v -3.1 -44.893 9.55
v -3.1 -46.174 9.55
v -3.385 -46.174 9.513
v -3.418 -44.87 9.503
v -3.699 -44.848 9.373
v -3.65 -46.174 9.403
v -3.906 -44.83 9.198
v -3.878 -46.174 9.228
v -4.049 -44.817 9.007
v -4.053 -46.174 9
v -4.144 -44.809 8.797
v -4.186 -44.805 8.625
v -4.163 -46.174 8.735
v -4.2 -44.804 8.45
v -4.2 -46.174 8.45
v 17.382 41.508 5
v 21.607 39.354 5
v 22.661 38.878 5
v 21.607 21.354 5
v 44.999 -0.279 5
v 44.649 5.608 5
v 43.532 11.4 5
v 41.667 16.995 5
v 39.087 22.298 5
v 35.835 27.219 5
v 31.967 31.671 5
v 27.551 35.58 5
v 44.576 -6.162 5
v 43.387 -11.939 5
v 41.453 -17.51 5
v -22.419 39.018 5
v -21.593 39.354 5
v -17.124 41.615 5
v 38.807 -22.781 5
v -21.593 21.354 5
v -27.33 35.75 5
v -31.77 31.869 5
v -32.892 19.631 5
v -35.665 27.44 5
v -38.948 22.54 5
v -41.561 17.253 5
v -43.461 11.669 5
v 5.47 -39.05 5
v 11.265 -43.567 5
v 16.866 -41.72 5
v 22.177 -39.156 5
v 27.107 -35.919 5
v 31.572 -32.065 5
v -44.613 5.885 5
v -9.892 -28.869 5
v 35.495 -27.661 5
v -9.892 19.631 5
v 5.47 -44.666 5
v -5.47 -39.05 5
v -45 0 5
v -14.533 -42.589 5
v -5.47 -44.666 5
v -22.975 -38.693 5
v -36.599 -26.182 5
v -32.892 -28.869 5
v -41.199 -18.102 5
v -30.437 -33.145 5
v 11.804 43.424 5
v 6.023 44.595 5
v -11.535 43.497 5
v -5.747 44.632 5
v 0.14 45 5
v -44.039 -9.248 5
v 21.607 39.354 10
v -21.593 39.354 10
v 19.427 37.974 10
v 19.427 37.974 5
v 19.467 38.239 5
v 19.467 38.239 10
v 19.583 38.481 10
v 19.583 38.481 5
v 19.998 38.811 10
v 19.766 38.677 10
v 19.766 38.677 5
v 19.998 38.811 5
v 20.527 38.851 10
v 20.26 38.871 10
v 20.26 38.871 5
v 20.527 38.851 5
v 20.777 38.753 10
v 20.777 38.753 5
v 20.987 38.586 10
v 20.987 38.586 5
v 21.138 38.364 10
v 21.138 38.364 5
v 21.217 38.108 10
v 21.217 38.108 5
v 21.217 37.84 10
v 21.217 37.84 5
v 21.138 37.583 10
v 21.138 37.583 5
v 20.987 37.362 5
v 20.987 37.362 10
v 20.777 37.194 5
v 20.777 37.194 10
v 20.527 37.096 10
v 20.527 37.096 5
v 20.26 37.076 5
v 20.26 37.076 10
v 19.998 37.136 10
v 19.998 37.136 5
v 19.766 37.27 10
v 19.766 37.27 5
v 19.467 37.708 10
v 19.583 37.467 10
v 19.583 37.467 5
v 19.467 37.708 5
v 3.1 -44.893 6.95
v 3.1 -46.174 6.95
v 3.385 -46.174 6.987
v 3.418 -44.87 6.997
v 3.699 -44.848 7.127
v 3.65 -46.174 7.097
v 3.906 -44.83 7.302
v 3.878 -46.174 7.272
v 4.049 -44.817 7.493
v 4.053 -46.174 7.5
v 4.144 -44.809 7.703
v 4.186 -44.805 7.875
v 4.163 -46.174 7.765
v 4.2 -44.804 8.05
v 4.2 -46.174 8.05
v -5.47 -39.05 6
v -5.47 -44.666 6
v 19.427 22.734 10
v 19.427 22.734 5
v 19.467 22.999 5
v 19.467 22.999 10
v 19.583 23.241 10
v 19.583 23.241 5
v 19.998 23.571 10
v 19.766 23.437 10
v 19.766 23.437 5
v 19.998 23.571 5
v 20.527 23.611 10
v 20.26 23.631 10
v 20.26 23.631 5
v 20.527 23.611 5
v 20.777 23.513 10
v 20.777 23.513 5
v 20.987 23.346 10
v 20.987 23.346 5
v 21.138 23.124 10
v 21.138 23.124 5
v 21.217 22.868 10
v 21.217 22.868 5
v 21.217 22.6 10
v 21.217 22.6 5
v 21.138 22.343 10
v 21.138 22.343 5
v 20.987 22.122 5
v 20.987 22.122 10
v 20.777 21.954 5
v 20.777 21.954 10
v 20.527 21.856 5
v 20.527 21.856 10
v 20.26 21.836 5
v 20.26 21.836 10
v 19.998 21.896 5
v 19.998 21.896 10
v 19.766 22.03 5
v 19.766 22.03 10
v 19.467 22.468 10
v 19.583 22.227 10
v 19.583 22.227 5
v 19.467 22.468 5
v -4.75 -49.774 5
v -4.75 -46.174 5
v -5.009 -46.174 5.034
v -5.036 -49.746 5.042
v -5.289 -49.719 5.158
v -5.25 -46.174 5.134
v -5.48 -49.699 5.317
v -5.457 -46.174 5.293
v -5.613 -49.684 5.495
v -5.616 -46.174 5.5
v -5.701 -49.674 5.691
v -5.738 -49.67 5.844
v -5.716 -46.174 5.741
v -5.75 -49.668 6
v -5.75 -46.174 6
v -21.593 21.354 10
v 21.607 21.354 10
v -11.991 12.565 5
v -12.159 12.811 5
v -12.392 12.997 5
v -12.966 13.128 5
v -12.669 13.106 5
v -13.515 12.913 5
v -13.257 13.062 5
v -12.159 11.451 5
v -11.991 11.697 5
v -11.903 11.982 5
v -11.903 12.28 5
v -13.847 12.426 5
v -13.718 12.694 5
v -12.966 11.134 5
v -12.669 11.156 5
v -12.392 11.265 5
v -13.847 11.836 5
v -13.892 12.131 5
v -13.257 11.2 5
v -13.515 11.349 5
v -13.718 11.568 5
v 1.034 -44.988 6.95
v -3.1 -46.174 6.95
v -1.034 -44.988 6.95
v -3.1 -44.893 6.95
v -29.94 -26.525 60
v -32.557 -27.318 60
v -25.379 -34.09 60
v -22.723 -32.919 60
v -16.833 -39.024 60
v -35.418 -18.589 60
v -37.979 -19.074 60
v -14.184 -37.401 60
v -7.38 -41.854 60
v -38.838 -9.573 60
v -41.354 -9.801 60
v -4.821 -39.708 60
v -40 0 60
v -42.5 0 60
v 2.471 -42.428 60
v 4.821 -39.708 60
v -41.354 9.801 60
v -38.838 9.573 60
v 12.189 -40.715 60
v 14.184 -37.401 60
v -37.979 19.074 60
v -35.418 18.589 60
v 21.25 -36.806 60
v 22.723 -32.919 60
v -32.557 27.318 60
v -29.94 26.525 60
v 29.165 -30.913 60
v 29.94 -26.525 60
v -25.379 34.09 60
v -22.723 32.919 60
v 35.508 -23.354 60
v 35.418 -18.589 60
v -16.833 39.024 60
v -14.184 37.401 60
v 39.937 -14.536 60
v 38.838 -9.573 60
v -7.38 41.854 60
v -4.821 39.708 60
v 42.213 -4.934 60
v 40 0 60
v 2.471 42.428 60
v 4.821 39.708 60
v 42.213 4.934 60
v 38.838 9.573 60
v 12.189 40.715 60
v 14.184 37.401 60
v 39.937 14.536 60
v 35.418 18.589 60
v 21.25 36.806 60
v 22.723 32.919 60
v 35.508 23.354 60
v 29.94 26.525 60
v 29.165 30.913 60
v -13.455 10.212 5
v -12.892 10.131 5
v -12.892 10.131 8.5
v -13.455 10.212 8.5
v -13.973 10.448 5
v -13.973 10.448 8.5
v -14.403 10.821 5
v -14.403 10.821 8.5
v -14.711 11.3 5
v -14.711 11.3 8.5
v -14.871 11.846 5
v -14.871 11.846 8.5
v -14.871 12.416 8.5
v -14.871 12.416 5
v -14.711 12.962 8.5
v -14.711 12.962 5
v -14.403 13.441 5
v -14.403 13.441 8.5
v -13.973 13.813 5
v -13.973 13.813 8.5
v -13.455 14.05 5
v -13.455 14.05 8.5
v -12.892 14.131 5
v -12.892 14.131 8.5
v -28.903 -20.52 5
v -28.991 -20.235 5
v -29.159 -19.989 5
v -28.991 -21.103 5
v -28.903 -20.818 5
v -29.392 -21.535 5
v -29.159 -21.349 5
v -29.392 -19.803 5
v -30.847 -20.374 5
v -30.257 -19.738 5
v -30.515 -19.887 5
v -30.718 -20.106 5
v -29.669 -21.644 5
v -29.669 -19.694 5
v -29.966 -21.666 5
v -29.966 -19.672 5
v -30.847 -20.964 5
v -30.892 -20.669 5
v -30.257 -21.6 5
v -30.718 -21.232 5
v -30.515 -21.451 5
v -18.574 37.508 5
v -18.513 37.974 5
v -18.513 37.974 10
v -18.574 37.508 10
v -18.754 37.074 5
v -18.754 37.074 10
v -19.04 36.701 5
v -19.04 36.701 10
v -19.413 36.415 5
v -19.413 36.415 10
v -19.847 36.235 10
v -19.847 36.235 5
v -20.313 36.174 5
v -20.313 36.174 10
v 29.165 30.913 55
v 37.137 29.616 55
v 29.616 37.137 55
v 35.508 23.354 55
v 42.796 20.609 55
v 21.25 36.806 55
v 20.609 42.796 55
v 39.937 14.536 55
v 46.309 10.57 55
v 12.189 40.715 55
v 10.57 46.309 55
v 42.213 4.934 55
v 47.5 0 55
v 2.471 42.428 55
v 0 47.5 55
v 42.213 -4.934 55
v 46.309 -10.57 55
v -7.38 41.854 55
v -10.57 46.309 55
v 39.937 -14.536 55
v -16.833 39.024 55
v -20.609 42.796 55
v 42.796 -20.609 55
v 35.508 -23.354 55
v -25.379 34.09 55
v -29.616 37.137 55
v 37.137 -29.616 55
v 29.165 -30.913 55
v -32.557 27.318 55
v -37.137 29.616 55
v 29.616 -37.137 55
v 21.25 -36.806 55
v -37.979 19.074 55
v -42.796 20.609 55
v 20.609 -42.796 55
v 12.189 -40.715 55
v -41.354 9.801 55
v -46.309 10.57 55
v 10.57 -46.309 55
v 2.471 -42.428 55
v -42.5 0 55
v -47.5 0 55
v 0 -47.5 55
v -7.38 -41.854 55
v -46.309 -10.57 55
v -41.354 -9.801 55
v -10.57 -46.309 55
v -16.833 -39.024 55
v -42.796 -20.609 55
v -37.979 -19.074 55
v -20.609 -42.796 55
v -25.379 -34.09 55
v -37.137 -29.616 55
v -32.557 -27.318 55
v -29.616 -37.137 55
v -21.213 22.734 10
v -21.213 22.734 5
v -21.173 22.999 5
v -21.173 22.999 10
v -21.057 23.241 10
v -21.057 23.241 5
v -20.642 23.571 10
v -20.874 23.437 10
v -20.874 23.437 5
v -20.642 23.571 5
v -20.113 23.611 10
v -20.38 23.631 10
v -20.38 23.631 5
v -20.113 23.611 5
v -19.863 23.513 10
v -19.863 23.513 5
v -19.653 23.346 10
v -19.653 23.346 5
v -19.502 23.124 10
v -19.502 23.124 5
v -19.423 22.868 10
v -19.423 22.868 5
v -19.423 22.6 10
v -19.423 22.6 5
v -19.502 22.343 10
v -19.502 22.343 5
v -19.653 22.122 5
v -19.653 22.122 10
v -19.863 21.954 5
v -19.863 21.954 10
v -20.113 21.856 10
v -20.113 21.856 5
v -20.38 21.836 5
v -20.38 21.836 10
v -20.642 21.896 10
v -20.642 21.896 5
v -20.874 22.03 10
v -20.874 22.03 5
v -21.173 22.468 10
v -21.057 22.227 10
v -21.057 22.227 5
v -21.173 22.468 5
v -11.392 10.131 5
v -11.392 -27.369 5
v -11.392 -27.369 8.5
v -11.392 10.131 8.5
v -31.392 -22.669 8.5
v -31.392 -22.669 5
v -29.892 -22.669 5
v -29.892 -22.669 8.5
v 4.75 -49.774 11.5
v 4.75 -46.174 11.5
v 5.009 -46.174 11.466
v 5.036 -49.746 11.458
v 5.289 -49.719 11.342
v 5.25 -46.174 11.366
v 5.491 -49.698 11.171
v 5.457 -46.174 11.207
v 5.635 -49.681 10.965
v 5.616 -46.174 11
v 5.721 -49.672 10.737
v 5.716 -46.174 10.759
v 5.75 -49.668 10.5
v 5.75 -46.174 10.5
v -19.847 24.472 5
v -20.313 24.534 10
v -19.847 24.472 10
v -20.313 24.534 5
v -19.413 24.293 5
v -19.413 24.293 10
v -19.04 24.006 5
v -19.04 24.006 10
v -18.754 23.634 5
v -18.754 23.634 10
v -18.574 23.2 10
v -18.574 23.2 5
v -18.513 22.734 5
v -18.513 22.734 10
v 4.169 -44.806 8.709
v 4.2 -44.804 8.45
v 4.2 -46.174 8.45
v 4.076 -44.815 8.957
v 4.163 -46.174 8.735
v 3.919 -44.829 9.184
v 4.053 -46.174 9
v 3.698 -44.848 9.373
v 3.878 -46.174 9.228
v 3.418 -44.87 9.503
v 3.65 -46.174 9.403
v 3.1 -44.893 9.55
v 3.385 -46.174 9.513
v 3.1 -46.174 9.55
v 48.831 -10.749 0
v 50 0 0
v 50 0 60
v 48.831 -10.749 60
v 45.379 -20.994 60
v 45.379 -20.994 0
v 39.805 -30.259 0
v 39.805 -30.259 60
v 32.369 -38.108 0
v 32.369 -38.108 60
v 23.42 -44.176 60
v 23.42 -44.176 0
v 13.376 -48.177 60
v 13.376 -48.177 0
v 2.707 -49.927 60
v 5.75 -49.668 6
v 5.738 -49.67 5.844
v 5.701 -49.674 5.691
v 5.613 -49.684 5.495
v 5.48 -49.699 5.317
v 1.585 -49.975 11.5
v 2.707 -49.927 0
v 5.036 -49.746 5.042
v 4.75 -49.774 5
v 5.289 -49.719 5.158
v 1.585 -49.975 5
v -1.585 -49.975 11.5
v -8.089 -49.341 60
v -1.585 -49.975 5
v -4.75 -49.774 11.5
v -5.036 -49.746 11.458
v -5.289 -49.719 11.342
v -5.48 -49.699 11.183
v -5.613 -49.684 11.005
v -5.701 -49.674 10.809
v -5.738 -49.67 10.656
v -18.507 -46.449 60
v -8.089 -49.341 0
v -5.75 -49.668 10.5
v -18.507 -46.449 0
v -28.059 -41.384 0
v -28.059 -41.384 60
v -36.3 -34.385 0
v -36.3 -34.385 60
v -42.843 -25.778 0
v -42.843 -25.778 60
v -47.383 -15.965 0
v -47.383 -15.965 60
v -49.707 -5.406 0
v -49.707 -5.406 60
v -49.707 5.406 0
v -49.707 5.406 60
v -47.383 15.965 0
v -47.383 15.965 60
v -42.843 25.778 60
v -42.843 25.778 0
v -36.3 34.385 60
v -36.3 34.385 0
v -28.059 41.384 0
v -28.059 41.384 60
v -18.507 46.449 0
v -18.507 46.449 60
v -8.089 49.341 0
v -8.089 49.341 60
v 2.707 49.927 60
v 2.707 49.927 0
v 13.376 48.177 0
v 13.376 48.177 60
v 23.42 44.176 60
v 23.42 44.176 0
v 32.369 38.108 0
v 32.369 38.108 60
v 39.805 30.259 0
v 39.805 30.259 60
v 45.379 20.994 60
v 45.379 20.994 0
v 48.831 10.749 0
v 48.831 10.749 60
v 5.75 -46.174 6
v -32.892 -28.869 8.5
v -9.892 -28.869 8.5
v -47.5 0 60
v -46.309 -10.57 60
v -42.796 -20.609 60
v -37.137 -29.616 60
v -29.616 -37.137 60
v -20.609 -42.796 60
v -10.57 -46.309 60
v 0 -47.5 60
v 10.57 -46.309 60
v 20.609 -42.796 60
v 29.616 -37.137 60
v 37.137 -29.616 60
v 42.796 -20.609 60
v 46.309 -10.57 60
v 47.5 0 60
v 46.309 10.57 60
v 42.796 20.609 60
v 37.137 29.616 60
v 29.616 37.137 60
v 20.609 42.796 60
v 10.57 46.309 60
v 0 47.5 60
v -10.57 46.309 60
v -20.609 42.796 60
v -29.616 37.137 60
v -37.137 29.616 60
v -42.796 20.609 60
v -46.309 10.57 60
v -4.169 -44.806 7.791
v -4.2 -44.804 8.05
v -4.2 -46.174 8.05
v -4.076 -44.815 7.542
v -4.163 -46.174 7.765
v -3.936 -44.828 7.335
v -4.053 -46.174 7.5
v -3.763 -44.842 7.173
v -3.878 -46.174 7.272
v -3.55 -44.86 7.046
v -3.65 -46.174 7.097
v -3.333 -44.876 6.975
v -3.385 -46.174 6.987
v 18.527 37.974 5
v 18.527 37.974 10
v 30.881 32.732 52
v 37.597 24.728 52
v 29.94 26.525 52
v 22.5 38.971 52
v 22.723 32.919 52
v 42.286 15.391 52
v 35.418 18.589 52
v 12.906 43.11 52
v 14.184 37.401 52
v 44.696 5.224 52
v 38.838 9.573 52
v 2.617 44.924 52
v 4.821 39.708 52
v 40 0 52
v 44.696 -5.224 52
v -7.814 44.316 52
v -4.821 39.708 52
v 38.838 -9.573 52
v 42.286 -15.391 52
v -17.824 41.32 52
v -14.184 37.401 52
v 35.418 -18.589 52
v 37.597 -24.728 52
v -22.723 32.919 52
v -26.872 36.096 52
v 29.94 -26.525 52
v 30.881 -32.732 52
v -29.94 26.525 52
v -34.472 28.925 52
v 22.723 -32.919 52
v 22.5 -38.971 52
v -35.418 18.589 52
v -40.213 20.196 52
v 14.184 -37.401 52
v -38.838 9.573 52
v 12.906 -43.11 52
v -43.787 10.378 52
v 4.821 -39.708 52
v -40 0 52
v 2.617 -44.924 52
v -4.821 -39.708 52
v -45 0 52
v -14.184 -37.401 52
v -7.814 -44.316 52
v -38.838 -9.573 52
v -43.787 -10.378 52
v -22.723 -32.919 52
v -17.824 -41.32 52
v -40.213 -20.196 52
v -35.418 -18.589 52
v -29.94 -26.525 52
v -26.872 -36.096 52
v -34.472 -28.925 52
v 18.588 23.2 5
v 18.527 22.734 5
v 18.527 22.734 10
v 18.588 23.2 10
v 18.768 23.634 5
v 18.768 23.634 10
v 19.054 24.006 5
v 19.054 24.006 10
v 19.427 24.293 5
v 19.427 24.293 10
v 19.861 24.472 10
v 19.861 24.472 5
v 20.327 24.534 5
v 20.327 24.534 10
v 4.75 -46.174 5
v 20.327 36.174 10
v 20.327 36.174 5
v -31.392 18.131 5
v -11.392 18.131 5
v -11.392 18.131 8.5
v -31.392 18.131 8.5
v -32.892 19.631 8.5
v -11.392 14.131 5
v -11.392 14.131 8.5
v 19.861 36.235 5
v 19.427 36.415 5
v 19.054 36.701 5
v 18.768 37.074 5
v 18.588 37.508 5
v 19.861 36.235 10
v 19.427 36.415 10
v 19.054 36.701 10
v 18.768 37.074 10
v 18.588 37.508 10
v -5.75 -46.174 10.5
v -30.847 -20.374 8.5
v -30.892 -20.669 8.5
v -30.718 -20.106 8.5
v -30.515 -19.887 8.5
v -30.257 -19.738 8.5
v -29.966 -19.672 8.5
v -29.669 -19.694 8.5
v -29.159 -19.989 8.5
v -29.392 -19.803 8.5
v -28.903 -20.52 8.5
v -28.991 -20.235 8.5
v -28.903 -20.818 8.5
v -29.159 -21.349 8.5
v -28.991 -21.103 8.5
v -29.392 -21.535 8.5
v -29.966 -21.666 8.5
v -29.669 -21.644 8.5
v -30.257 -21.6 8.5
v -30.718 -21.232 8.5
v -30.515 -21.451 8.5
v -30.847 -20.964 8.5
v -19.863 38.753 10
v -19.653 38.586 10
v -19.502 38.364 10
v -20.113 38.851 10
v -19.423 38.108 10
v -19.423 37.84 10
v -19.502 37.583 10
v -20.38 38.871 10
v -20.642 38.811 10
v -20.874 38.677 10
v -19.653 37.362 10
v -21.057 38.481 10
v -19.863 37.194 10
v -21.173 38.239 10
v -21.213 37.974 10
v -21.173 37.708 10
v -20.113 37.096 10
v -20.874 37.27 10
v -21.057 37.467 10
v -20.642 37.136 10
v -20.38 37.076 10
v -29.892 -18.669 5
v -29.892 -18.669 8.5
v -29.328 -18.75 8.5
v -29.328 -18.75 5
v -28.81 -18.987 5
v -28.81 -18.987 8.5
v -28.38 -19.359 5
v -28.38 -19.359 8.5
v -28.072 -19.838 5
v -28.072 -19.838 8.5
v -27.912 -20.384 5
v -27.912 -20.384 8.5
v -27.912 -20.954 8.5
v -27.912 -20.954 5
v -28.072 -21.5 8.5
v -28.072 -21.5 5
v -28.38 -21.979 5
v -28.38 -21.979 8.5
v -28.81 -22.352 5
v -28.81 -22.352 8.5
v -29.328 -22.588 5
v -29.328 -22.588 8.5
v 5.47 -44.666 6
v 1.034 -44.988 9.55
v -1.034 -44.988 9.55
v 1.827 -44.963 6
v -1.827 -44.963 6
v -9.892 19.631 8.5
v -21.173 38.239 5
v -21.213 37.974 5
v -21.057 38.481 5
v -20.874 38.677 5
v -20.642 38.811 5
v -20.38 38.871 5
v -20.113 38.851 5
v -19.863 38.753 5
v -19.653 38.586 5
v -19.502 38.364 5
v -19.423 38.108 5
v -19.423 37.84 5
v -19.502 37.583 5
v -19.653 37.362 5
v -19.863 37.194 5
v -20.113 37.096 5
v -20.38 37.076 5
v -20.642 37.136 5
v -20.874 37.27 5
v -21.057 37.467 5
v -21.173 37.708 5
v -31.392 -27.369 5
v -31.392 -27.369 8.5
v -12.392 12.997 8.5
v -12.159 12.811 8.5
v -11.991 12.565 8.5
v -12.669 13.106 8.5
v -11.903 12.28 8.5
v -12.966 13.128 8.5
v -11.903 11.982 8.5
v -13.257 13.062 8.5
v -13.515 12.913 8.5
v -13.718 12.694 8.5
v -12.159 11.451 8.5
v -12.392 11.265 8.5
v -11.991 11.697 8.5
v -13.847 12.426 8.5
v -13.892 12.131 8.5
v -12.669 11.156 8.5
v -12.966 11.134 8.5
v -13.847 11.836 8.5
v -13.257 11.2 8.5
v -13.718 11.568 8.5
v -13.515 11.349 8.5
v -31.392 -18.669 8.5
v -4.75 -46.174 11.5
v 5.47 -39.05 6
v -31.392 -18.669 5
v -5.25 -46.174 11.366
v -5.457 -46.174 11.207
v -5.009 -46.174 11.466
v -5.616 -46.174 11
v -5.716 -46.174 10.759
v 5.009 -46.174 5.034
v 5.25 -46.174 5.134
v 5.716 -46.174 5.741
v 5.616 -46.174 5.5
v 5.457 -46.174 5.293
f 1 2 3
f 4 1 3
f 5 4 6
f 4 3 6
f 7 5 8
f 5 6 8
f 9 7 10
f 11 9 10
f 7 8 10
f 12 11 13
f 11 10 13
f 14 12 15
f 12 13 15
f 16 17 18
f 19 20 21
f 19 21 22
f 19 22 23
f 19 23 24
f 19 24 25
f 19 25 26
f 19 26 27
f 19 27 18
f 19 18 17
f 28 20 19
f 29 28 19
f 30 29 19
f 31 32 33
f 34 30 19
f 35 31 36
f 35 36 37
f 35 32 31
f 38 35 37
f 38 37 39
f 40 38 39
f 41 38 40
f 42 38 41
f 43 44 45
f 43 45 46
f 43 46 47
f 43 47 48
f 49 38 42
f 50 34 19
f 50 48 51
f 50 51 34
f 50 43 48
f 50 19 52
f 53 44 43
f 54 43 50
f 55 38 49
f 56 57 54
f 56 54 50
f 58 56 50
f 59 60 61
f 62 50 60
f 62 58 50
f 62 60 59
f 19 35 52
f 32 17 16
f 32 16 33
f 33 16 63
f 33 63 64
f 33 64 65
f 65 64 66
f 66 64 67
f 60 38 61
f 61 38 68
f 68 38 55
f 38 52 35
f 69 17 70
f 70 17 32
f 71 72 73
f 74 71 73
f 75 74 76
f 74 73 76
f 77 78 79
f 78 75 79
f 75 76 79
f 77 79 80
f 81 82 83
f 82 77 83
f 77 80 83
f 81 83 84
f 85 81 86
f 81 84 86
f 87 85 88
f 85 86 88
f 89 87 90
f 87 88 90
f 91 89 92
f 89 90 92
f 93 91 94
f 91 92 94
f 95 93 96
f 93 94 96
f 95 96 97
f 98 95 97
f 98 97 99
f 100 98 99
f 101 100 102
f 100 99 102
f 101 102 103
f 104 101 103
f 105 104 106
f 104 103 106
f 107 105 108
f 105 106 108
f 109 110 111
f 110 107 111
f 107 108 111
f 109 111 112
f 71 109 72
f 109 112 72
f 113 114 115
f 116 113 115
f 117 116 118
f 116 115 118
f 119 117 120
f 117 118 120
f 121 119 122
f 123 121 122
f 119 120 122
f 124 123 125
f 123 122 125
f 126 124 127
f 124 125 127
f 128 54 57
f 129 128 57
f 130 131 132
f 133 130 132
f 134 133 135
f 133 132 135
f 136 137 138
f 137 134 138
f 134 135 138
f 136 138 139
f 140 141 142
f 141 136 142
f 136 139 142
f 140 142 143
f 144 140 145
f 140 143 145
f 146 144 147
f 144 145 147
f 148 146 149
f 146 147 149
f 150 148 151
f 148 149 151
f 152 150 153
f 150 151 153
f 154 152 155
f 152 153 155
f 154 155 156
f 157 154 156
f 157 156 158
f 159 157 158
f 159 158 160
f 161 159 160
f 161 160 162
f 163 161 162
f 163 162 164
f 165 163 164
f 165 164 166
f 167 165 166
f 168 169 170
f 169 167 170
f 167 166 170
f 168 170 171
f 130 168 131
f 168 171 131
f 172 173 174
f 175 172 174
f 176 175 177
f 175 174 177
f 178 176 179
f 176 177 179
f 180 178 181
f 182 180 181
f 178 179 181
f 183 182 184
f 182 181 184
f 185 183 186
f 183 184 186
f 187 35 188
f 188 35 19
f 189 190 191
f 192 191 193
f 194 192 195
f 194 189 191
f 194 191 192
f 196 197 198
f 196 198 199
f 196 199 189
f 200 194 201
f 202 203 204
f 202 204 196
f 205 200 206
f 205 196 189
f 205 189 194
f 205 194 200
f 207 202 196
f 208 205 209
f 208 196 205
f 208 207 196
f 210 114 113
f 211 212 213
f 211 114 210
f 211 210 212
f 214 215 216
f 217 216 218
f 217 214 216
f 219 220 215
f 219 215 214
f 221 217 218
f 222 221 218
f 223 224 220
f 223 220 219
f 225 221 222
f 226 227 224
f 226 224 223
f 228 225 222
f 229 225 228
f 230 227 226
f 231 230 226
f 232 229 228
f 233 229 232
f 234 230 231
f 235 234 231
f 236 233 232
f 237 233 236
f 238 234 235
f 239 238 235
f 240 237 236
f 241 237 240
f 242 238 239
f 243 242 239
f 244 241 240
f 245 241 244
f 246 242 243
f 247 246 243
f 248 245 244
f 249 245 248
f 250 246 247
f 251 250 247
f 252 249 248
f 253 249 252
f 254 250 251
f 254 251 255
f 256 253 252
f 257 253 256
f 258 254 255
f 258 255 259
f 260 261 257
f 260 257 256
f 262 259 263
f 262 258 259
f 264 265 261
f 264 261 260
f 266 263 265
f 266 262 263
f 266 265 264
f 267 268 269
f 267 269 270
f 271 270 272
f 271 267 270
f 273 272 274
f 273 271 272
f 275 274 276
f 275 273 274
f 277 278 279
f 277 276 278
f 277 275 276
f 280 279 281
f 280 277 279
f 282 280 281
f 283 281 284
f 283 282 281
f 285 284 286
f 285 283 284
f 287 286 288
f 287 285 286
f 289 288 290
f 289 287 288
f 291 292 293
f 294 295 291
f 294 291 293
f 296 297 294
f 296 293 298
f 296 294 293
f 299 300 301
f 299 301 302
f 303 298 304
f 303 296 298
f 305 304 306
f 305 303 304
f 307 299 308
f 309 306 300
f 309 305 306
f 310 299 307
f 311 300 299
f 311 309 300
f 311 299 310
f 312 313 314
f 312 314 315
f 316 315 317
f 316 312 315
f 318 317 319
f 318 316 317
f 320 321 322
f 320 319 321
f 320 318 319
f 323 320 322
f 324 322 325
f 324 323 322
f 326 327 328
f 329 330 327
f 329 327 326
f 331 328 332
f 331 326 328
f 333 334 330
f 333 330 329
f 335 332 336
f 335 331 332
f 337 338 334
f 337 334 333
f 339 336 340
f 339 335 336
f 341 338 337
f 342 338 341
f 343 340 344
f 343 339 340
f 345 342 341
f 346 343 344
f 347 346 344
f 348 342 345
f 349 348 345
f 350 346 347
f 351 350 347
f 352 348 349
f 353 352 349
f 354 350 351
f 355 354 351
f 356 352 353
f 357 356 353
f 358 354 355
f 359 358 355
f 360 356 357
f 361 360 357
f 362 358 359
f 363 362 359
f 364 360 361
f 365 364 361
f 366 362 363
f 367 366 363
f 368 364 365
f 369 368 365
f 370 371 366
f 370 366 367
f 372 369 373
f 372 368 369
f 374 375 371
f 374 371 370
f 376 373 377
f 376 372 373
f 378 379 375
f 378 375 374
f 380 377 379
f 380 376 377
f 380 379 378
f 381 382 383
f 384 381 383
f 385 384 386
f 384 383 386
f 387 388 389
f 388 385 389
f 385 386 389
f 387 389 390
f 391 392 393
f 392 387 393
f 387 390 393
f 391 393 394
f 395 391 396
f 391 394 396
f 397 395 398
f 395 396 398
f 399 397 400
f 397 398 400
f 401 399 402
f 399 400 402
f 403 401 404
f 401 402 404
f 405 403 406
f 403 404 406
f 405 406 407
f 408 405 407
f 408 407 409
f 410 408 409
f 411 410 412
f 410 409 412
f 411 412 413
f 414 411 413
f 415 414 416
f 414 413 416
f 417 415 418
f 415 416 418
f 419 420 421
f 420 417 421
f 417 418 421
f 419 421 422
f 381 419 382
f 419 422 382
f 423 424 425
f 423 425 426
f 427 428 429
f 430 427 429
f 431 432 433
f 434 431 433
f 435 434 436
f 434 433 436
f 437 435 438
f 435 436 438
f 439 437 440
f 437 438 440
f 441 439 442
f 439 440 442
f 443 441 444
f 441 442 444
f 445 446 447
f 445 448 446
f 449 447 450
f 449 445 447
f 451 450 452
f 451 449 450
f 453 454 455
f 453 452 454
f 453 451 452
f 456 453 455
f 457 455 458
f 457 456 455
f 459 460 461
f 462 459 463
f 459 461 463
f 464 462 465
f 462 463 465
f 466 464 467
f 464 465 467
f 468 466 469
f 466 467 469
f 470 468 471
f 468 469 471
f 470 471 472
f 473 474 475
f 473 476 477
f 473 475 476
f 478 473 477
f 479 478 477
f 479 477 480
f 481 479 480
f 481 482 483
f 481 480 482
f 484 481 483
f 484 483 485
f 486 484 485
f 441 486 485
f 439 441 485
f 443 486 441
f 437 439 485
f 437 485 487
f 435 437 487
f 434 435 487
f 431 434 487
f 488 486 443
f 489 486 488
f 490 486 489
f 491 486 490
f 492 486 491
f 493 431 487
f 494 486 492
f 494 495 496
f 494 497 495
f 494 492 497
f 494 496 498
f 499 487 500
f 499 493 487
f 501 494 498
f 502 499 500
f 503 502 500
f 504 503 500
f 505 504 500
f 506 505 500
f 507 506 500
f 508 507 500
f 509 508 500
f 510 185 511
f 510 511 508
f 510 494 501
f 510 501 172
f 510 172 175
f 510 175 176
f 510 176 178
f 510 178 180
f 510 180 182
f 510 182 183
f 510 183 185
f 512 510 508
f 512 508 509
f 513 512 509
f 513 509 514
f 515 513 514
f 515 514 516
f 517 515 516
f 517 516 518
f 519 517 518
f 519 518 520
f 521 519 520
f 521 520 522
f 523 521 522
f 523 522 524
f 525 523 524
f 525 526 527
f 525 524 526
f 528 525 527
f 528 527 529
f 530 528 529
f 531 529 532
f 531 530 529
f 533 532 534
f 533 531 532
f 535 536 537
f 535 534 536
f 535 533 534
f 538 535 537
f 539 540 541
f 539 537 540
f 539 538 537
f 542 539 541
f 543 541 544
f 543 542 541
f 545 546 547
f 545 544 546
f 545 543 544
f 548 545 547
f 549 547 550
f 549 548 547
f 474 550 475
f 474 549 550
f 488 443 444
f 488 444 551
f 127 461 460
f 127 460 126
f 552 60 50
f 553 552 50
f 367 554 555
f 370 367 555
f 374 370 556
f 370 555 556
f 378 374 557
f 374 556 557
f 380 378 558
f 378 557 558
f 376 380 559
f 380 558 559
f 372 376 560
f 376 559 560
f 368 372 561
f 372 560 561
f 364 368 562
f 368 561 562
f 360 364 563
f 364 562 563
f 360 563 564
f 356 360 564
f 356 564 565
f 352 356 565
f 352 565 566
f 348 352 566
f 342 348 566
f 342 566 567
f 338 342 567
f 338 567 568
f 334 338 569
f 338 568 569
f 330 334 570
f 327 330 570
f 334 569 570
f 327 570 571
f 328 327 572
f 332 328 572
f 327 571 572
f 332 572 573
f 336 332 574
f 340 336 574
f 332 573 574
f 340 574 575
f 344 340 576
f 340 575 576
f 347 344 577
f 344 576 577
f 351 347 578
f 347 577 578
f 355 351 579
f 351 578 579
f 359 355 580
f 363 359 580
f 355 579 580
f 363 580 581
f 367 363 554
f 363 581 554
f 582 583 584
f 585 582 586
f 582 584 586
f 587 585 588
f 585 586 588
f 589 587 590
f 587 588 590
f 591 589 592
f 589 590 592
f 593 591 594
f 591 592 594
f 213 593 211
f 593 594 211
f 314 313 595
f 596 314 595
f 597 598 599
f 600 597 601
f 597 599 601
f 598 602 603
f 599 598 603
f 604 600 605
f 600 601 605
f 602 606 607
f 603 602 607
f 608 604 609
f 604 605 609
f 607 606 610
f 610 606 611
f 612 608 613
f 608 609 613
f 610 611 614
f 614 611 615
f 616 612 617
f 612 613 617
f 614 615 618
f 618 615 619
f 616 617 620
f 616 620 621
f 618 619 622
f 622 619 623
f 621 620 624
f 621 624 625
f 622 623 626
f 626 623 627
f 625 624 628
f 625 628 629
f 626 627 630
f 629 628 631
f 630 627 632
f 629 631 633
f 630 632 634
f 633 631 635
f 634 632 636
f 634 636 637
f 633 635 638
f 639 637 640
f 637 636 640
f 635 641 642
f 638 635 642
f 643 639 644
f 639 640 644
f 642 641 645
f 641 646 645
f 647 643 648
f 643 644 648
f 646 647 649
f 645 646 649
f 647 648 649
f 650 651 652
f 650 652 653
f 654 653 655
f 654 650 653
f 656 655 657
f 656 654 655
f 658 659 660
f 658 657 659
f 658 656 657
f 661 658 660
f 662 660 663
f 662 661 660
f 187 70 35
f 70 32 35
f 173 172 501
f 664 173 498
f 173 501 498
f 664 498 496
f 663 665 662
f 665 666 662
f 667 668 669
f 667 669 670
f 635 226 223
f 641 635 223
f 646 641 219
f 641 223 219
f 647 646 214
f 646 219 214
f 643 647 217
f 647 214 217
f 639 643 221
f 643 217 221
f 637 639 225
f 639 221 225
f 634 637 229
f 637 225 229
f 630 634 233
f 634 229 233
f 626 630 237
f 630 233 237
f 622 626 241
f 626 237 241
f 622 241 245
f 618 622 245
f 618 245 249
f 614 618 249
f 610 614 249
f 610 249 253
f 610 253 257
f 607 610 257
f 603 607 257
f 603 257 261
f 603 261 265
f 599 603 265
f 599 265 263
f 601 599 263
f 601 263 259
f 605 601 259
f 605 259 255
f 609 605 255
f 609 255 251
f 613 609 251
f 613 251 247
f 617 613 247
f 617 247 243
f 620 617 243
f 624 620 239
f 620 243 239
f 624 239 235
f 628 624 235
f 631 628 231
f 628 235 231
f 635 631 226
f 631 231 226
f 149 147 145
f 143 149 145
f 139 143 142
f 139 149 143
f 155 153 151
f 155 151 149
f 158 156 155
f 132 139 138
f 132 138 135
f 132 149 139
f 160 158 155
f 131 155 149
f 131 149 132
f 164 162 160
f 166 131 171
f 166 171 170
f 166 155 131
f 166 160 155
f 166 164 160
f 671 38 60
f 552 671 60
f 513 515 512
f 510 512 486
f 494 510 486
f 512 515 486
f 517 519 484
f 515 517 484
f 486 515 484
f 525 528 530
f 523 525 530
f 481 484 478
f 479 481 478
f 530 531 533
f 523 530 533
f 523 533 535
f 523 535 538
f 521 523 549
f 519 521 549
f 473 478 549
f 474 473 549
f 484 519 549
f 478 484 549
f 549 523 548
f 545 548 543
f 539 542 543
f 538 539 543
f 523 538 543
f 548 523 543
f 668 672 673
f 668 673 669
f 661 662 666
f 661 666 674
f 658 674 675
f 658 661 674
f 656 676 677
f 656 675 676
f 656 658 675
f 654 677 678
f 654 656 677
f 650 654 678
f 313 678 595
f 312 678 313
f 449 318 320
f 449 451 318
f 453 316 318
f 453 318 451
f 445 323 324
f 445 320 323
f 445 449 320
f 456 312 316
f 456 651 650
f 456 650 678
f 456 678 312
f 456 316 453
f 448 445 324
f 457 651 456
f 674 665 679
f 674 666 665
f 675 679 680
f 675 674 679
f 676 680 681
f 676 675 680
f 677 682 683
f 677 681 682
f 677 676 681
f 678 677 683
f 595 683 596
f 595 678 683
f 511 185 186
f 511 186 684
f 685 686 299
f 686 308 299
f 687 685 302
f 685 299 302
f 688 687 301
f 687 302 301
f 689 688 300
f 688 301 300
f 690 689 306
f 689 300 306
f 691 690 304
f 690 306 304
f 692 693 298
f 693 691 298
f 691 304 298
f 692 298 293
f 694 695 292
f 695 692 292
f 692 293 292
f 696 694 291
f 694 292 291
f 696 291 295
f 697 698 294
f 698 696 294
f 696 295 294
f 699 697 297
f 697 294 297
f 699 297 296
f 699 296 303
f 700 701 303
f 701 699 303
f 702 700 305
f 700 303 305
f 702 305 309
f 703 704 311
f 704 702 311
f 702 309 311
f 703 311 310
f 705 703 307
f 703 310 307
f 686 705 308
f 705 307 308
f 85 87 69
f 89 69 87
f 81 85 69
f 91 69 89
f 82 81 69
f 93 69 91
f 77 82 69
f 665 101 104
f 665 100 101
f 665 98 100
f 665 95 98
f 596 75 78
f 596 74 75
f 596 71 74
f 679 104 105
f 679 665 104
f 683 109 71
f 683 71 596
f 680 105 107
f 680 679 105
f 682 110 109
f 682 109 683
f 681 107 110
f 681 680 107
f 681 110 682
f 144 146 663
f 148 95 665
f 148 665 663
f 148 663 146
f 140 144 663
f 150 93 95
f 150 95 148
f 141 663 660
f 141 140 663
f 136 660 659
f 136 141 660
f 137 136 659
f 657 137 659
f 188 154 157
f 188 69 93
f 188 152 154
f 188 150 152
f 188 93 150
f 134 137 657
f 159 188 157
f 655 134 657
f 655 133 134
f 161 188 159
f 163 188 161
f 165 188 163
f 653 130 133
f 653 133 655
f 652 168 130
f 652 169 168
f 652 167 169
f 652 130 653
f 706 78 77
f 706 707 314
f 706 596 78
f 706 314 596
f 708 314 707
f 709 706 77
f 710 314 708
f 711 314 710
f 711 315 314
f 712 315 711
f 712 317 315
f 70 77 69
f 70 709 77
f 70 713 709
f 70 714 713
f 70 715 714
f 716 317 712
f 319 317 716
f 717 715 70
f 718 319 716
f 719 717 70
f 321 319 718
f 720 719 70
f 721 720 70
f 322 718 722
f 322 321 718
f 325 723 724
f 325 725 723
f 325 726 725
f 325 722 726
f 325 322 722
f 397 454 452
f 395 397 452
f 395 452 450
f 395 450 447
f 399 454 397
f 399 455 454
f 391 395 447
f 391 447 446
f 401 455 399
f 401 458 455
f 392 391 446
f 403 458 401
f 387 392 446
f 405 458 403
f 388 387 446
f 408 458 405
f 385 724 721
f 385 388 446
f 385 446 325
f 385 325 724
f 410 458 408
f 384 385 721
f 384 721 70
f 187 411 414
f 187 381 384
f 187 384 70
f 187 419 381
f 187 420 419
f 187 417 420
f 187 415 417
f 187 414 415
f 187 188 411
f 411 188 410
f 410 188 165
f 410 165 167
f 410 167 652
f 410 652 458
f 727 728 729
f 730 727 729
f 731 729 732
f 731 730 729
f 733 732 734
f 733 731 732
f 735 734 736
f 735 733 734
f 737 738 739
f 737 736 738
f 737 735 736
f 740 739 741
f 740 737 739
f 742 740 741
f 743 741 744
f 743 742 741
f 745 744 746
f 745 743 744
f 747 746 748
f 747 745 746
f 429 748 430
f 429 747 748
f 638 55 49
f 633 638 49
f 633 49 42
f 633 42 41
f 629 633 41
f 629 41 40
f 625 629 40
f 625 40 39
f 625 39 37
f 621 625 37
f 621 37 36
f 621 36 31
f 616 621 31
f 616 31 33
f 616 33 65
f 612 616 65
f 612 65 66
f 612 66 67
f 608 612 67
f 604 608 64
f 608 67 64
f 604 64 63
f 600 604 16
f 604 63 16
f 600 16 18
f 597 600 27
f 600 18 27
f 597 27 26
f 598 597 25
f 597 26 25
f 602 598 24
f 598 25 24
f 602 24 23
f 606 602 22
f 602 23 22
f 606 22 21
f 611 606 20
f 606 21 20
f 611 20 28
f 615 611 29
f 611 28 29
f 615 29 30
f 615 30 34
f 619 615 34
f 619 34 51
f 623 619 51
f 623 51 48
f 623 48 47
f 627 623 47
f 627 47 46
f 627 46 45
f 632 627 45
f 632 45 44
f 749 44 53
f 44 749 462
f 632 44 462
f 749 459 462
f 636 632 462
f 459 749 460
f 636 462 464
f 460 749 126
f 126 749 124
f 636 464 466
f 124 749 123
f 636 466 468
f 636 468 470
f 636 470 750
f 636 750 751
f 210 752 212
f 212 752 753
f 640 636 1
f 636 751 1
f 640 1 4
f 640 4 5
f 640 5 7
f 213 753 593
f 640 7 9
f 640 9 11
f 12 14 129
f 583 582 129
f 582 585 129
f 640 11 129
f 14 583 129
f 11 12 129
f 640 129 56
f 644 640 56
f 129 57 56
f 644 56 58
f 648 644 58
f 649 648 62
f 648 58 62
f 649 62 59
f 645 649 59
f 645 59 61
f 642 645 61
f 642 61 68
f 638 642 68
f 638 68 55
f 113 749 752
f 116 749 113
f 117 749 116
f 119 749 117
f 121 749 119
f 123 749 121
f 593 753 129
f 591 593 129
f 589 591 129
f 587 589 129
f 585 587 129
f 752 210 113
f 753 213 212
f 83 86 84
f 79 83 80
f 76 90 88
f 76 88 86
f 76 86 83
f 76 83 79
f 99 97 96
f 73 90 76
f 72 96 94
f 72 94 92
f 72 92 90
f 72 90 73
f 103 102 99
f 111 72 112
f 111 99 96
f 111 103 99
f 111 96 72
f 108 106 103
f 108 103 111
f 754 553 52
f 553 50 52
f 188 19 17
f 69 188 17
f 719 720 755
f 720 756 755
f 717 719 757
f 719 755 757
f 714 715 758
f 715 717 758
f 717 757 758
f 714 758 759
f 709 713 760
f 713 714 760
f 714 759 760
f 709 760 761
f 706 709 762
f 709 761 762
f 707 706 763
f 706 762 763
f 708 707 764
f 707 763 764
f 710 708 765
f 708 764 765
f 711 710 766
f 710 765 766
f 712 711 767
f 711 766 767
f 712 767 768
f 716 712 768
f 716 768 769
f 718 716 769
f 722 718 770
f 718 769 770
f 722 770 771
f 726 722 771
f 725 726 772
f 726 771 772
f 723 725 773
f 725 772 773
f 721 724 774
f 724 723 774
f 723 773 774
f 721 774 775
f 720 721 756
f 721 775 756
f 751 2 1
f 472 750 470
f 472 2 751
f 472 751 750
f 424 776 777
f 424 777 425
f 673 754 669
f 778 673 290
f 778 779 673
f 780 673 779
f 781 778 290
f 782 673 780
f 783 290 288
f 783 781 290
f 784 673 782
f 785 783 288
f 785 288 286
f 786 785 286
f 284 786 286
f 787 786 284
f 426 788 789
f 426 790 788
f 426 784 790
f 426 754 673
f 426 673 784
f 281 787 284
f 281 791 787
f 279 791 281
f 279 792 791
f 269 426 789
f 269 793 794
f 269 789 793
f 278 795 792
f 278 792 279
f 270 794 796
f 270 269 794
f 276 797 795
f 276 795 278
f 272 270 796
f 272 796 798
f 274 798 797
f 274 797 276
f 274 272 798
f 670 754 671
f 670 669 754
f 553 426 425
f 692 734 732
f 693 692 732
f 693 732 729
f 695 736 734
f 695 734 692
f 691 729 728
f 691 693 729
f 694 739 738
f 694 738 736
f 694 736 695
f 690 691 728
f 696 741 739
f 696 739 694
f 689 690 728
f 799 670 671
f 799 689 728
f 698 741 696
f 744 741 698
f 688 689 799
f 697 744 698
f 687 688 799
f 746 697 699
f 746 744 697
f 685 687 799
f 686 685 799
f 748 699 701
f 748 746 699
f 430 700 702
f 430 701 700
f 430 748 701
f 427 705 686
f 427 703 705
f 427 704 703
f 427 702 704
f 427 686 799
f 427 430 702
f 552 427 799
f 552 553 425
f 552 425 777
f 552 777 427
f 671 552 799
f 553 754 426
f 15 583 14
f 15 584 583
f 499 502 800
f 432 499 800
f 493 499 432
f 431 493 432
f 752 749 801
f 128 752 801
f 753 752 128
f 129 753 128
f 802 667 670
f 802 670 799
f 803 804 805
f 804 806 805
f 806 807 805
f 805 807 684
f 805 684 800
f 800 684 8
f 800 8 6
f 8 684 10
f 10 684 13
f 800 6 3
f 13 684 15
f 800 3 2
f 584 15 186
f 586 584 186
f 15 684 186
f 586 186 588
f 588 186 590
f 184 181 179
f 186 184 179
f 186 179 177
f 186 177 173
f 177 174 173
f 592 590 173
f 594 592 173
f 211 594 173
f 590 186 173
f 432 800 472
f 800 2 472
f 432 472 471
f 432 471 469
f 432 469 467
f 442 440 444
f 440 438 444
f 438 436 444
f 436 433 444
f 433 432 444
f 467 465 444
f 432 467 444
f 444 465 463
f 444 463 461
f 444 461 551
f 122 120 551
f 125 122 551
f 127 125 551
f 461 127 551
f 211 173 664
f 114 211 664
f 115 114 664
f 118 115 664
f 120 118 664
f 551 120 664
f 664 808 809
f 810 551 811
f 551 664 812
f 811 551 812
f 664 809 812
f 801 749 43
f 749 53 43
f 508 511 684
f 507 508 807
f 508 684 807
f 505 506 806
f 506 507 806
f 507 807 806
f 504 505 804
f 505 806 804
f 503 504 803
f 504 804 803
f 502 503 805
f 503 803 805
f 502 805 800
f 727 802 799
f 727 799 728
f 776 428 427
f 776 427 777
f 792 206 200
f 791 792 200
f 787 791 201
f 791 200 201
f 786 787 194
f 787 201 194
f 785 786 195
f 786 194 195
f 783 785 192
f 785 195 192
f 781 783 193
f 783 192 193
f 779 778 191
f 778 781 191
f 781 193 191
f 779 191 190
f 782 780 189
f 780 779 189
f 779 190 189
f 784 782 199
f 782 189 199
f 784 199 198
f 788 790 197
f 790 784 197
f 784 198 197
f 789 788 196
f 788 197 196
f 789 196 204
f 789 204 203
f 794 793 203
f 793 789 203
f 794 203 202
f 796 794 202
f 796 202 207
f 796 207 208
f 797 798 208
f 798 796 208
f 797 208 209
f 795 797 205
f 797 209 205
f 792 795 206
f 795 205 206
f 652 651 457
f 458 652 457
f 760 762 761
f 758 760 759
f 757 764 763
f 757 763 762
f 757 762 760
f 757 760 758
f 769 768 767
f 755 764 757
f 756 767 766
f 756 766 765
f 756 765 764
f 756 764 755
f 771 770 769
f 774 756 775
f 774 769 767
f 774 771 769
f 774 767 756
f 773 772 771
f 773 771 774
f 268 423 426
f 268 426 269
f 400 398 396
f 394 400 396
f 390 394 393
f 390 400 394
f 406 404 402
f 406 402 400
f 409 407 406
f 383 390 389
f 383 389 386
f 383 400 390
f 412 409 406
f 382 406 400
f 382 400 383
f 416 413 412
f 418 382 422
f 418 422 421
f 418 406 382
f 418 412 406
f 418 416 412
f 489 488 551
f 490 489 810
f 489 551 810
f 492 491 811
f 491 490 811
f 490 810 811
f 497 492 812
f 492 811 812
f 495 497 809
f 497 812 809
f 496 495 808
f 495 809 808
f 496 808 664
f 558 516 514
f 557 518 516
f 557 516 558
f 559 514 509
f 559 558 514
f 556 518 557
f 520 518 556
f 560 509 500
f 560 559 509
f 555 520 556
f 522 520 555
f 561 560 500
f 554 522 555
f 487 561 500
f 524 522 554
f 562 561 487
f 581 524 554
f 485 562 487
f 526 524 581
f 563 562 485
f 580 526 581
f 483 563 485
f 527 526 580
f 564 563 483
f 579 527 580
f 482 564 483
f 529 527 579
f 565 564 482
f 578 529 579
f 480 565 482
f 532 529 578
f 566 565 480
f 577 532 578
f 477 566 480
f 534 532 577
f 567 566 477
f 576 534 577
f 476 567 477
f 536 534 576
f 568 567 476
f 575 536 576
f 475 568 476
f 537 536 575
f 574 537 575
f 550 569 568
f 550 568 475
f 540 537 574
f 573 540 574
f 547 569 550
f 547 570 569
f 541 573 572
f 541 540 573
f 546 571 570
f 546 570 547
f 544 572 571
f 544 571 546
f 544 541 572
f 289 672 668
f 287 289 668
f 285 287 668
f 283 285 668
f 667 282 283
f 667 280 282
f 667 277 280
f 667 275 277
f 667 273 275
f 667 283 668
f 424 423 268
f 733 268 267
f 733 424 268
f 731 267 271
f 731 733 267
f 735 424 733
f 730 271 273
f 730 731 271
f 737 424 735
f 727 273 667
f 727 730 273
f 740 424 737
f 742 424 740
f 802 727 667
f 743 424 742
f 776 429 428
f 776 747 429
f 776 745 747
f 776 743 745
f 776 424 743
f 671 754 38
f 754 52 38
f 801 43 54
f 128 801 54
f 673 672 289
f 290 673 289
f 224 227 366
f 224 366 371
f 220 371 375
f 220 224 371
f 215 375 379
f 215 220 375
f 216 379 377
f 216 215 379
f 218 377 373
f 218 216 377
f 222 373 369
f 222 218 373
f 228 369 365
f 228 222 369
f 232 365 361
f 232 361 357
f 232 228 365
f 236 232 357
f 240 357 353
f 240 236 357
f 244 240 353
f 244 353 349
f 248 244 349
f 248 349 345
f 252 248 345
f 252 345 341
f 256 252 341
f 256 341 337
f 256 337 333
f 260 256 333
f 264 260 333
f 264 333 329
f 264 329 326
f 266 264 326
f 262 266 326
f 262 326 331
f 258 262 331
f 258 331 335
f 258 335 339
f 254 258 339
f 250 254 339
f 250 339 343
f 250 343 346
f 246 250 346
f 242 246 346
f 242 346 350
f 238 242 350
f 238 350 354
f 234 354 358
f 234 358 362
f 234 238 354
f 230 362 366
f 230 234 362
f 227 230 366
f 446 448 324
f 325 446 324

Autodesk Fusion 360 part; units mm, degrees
sketch "Boceto1" plane through (0, 0, 0) normal (0, 0, 1) x (1, 0, 0)
  circle A0 centre (0, 0) radius 50
  dimension "d4" = 100
extrude "Extruir1" add sketch "Boceto1" along normal blind 60
sketch "Boceto2" plane through (0, 0, 60) normal (0, 0, 1) x (-1, 0, 0)
  circle A0 centre (0, 0) radius 50
  circle A1 centre (0, 0) radius 47.5
  circle A2 centre (0, 0) radius 42.5
  circle A3 centre (0, 0) radius 40
  dimension "d7" = 95
  dimension "d8" = 85
  dimension "d9" = 80
extrude "Extruir2" cut sketch "Boceto2" against normal blind 5 contours A1 | A3
extrude "Extruir3" cut 1 faces at (-12.741, 3.9301, 55) along direction (0, 0, -1) blind 50
sketch "Boceto3" plane through (0, 0, 5) normal (0, 0, 1) x (-1, 0, 0)
  circle A0 centre (0, 0) radius 45
  dimension "d14" = 90
extrude "Extruir4" cut sketch "Boceto3" along normal blind 47
sketch "Boceto4" plane through (0, 0, 5) normal (0, 0, 1) x (-1, 0, 0)
  circle A0 centre (0, 0) radius 45
  line L0 (21.5929, -21.3537) -> (-21.6071, -21.3537)
  line L1 (-21.6071, -21.3537) -> (-21.6071, -39.3537)
  line L2 (-21.6071, -39.3537) -> (21.5929, -39.3537)
  line L3 (21.5929, -39.3537) -> (21.5929, -21.3537)
  line L4 (21.5929, -21.3537) -> (-21.6071, -39.3537) construction
  line L5 (-21.6071, -21.3537) -> (21.5929, -39.3537) construction
  line L6 (20.3129, -24.5337) -> (20.3129, -36.1737)
  line L7 (-20.3271, -36.1737) -> (-20.3271, -24.5337)
  line L8 (-20.3271, -22.7337) -> (20.3129, -37.9737) construction
  line L9 (20.3129, -22.7337) -> (-20.3271, -37.9737) construction
  circle A1 centre (20.3129, -37.9737) radius 0.9
  circle A2 centre (20.3129, -22.7337) radius 0.9
  circle A3 centre (-20.3271, -22.7337) radius 0.9
  circle A4 centre (-20.3271, -37.9737) radius 0.9
  arc A5 (20.3129, -36.1737) -> (18.5129, -37.9737) centre (20.3129, -37.9737) ccw
  arc A6 (18.5129, -22.7337) -> (20.3129, -24.5337) centre (20.3129, -22.7337) ccw
  arc A7 (-20.3271, -24.5337) -> (-18.5271, -22.7337) centre (-20.3271, -22.7337) ccw
  line L10 (-18.5271, -22.7337) -> (18.5129, -22.7337)
  arc A8 (-18.5271, -37.9737) -> (-20.3271, -36.1737) centre (-20.3271, -37.9737) ccw
  line L11 (18.5129, -37.9737) -> (-18.5271, -37.9737)
  point P0 (-0.0071, -30.3537)
  point P1 (-0.0071, -30.3537)
  dimension "d17" = 43.2
  dimension "d18" = 18
  dimension "d19" = 40.64
  dimension "d20" = 15.24
  dimension "d21" = 1.8
  dimension "d22" = 1.8
  dimension "d23" = 1.8
  dimension "d24" = 1.8
  dimension "d25" = 3.6
  dimension "d28" = 3.6
extrude "Extruir5" add sketch "Boceto4" along normal blind 5 contours L0 L1 L2 L3
thread "Rosca1" "ISO Metric profile 1.7 M1.7x0.35 6H" major diameter 1.7678 minor diameter 1.3711 pitch 0.35 angle 60 resizes the face on face at (-21.1033, 37.5432, 6.6667) on face at (19.5367, 37.5432, 6.6667) on face at (-21.2117, 22.7785, 8.3333) on face at (19.4283, 22.7785, 8.3333)
sketch "Boceto5" plane through (0, 0, 5) normal (0, 0, 1) x (-1, 0, 0)
  circle A0 centre (0, 0) radius 45
  line L0 (21.5929, -39.3537) -> (-21.6071, -39.3537)
  line L1 (-21.6071, -39.3537) -> (-21.6071, -21.3537)
  line L2 (-21.6071, -21.3537) -> (21.5929, -21.3537)
  line L3 (21.5929, -21.3537) -> (21.5929, -39.3537)
  line L4 (32.8916, 28.8691) -> (9.8916, 28.8691)
  line L5 (9.8916, 28.8691) -> (9.8916, -19.6309)
  line L6 (9.8916, -19.6309) -> (32.8916, -19.6309)
  line L7 (32.8916, -19.6309) -> (32.8916, 28.8691)
  line L8 (32.8916, 28.8691) -> (9.8916, -19.6309) construction
  line L9 (9.8916, 28.8691) -> (32.8916, -19.6309) construction
  line L10 (32.8916, 28.8691) -> (32.8916, 20.6691)
  line L11 (30.8916, 20.6691) -> (29.8916, 20.6691)
  line L12 (9.8916, -19.6309) -> (9.8916, -12.1309)
  circle A1 centre (29.8916, 20.6691) radius 1
  line L13 (31.3916, 27.3691) -> (11.3916, 27.3691)
  line L14 (11.3916, -18.1309) -> (31.3916, -18.1309)
  line L15 (31.3916, 27.3691) -> (11.3916, -18.1309) construction
  line L16 (11.3916, 27.3691) -> (31.3916, -18.1309) construction
  line L17 (31.3916, 18.6691) -> (29.8916, 18.6691)
  line L18 (31.3916, 22.6691) -> (29.8916, 22.6691)
  arc A2 (29.951, 22.6682) -> (29.8916, 18.6691) centre (29.8916, 20.6691) ccw
  line L19 (31.3916, -18.1309) -> (31.3916, 18.6691)
  line L20 (31.3916, 22.6691) -> (31.3916, 27.3691)
  line L21 (11.3916, 27.3691) -> (11.3916, -9.9856)
  line L22 (11.3916, -14.1309) -> (11.3916, -18.1309)
  circle A3 centre (12.8916, -12.1309) radius 1
  line L23 (11.3916, -10.1309) -> (12.8916, -10.1309)
  line L24 (11.3916, -14.1309) -> (12.8916, -14.1309)
  line L25 (11.3916, -9.9856) -> (11.3916, -10.1309)
  arc A4 (12.8916, -14.1309) -> (12.8916, -10.1309) centre (12.8916, -12.1309) ccw
  point P0 (21.3916, 4.6191)
  point P1 (21.3916, 4.6191)
  dimension "d31" = 23
  dimension "d32" = 48.5
  dimension "d33" = 8.2
  dimension "d34" = 3
  dimension "d35" = 7.5
  dimension "d38" = 2
  dimension "d39" = 20
  dimension "d40" = 45.5
  dimension "d41" = 4
  dimension "d47" = 180
  dimension "d48" = 3
  dimension "d49" = 2
  dimension "d50" = 4
extrude "Extruir6" add sketch "Boceto5" along normal blind 3.5 contours L4 L5 L6 L7 L10 L12
ref_plane "PlanoDeObra1" through (0, -50, 0) normal (0, 1, 0) x (0, 0, 1)
sketch "Boceto6" plane through (0, -50, 0) normal (0, 1, 0) x (1, 0, 0)
  line L0 (0, 0) -> (0, -5)
  line L1 (0, -5) -> (5.75, -5)
  line L2 (0, -5) -> (-5.75, -5)
  line L3 (-5.75, -5) -> (-5.75, -11.5)
  line L4 (-5.75, -11.5) -> (5.75, -11.5)
  line L5 (5.75, -11.5) -> (5.75, -5)
  line L6 (3.1, -6.95) -> (-3.1, -6.95)
  line L7 (-4.2, -8.05) -> (-4.2, -8.45)
  line L8 (-3.1, -9.55) -> (3.1, -9.55)
  line L9 (4.2, -8.45) -> (4.2, -8.05)
  line L10 (4.2, -6.95) -> (-4.2, -9.55) construction
  line L11 (-4.2, -6.95) -> (4.2, -9.55) construction
  arc A0 (-4.2, -8.45) -> (-3.1, -9.55) centre (-3.1, -8.45) ccw
  arc A1 (-3.1, -6.95) -> (-4.2, -8.05) centre (-3.1, -8.05) ccw
  arc A2 (4.2, -8.05) -> (3.1, -6.95) centre (3.1, -8.05) ccw
  arc A3 (3.1, -9.55) -> (4.2, -8.45) centre (3.1, -8.45) ccw
  point P0 (0, -8.25)
  dimension "d56" = 5
  dimension "d57" = 5.75
  dimension "d58" = 5.75
  dimension "d59" = 6.5
  dimension "d60" = 11.5
  dimension "d61" = 8.4
  dimension "d62" = 2.6
  dimension "d65" = 1.1
  dimension "d66" = 1.1
  dimension "d67" = 1.1
  dimension "d68" = 1.1
extrude "Extruir7" cut sketch "Boceto6" along normal blind 3 contours L1 L2 L3 L4 L5 | L6 L7 L8 L9 A0 A1 A2 A3
sketch "Boceto7" plane through (0, -47, 0) normal (0, -1, 0) x (1, 0, 0)
  line L0 (-5.75, 5) -> (5.75, 5)
  line L1 (5.75, 5) -> (5.75, 11.5)
  line L2 (5.75, 11.5) -> (-5.75, 11.5)
  line L3 (-5.75, 11.5) -> (-5.75, 5)
  line L4 (3.1, 6.95) -> (-3.1, 6.95)
  line L5 (-4.2, 8.05) -> (-4.2, 8.45)
  line L6 (-3.1, 9.55) -> (3.1, 9.55)
  line L7 (4.2, 8.45) -> (4.2, 8.05)
  line L8 (4.2, 6.95) -> (-4.2, 9.55) construction
  line L9 (-4.2, 6.95) -> (4.2, 9.55) construction
  arc A0 (-3.1, 9.55) -> (-4.2, 8.45) centre (-3.1, 8.45) ccw
  arc A1 (-4.2, 8.05) -> (-3.1, 6.95) centre (-3.1, 8.05) ccw
  arc A2 (4.2, 8.45) -> (3.1, 9.55) centre (3.1, 8.45) ccw
  arc A3 (3.1, 6.95) -> (4.2, 8.05) centre (3.1, 8.05) ccw
  point P0 (0, 8.25)
  dimension "d71" = 8.4
  dimension "d72" = 2.6
  dimension "d73" = 1.1
  dimension "d74" = 1.1
  dimension "d75" = 1.1
extrude "Extruir8" cut sketch "Boceto7" against normal blind 2.3 contours L4 L5 L6 L7 A0 A1 A2 A3
fillet "Empalme1" radius 1 4 edges at (-5.75, -48.3341, 11.5) (-5.75, -48.3341, 5) (5.75, -48.3341, 5) (5.75, -48.3341, 11.5)
extrude "Extruir9" cut 1 faces at (1.0333, -47, 10.85) along direction (0, 1, 0) blind 0.826
sketch "Boceto8" plane through (0, 0, 5) normal (0, 0, 1) x (-1, 0, 0)
  line L0 (21.5929, -39.3537) -> (-21.6071, -39.3537)
  line L1 (-21.6071, -39.3537) -> (-21.6071, -21.3537)
  line L2 (-21.6071, -21.3537) -> (21.5929, -21.3537)
  line L3 (21.5929, -21.3537) -> (21.5929, -39.3537)
  circle A0 centre (0, 0) radius 45
  line L4 (32.8916, -19.6309) -> (9.8916, -19.6309)
  line L5 (9.8916, -19.6309) -> (9.8916, 28.8691)
  line L6 (9.8916, 28.8691) -> (32.8916, 28.8691)
  line L7 (32.8916, 28.8691) -> (32.8916, -19.6309)
  line L8 (0, 45) -> (-5.47, 45)
  line L9 (0, 45) -> (5.47, 45)
  line L10 (-5.47, 45) -> (-5.47, 39.05)
  line L11 (-5.47, 39.05) -> (5.47, 39.05)
  line L12 (5.47, 39.05) -> (5.47, 45)
  dimension "d83" = 5.47
  dimension "d84" = 5.47
  dimension "d85" = 5.95
  dimension "d86" = 10.94
extrude "Extruir10" add sketch "Boceto8" along normal blind 1 contours A0 L10 L11 L12 picked at (0, 41.0333)
equation "DiametroBase = 100 mm"
equation "AlturaBase = 60 mm"
equation "AlturaPantalla = 200 mm"
equation "d4 = DiametroBase"
equation "d5 = AlturaBase"
